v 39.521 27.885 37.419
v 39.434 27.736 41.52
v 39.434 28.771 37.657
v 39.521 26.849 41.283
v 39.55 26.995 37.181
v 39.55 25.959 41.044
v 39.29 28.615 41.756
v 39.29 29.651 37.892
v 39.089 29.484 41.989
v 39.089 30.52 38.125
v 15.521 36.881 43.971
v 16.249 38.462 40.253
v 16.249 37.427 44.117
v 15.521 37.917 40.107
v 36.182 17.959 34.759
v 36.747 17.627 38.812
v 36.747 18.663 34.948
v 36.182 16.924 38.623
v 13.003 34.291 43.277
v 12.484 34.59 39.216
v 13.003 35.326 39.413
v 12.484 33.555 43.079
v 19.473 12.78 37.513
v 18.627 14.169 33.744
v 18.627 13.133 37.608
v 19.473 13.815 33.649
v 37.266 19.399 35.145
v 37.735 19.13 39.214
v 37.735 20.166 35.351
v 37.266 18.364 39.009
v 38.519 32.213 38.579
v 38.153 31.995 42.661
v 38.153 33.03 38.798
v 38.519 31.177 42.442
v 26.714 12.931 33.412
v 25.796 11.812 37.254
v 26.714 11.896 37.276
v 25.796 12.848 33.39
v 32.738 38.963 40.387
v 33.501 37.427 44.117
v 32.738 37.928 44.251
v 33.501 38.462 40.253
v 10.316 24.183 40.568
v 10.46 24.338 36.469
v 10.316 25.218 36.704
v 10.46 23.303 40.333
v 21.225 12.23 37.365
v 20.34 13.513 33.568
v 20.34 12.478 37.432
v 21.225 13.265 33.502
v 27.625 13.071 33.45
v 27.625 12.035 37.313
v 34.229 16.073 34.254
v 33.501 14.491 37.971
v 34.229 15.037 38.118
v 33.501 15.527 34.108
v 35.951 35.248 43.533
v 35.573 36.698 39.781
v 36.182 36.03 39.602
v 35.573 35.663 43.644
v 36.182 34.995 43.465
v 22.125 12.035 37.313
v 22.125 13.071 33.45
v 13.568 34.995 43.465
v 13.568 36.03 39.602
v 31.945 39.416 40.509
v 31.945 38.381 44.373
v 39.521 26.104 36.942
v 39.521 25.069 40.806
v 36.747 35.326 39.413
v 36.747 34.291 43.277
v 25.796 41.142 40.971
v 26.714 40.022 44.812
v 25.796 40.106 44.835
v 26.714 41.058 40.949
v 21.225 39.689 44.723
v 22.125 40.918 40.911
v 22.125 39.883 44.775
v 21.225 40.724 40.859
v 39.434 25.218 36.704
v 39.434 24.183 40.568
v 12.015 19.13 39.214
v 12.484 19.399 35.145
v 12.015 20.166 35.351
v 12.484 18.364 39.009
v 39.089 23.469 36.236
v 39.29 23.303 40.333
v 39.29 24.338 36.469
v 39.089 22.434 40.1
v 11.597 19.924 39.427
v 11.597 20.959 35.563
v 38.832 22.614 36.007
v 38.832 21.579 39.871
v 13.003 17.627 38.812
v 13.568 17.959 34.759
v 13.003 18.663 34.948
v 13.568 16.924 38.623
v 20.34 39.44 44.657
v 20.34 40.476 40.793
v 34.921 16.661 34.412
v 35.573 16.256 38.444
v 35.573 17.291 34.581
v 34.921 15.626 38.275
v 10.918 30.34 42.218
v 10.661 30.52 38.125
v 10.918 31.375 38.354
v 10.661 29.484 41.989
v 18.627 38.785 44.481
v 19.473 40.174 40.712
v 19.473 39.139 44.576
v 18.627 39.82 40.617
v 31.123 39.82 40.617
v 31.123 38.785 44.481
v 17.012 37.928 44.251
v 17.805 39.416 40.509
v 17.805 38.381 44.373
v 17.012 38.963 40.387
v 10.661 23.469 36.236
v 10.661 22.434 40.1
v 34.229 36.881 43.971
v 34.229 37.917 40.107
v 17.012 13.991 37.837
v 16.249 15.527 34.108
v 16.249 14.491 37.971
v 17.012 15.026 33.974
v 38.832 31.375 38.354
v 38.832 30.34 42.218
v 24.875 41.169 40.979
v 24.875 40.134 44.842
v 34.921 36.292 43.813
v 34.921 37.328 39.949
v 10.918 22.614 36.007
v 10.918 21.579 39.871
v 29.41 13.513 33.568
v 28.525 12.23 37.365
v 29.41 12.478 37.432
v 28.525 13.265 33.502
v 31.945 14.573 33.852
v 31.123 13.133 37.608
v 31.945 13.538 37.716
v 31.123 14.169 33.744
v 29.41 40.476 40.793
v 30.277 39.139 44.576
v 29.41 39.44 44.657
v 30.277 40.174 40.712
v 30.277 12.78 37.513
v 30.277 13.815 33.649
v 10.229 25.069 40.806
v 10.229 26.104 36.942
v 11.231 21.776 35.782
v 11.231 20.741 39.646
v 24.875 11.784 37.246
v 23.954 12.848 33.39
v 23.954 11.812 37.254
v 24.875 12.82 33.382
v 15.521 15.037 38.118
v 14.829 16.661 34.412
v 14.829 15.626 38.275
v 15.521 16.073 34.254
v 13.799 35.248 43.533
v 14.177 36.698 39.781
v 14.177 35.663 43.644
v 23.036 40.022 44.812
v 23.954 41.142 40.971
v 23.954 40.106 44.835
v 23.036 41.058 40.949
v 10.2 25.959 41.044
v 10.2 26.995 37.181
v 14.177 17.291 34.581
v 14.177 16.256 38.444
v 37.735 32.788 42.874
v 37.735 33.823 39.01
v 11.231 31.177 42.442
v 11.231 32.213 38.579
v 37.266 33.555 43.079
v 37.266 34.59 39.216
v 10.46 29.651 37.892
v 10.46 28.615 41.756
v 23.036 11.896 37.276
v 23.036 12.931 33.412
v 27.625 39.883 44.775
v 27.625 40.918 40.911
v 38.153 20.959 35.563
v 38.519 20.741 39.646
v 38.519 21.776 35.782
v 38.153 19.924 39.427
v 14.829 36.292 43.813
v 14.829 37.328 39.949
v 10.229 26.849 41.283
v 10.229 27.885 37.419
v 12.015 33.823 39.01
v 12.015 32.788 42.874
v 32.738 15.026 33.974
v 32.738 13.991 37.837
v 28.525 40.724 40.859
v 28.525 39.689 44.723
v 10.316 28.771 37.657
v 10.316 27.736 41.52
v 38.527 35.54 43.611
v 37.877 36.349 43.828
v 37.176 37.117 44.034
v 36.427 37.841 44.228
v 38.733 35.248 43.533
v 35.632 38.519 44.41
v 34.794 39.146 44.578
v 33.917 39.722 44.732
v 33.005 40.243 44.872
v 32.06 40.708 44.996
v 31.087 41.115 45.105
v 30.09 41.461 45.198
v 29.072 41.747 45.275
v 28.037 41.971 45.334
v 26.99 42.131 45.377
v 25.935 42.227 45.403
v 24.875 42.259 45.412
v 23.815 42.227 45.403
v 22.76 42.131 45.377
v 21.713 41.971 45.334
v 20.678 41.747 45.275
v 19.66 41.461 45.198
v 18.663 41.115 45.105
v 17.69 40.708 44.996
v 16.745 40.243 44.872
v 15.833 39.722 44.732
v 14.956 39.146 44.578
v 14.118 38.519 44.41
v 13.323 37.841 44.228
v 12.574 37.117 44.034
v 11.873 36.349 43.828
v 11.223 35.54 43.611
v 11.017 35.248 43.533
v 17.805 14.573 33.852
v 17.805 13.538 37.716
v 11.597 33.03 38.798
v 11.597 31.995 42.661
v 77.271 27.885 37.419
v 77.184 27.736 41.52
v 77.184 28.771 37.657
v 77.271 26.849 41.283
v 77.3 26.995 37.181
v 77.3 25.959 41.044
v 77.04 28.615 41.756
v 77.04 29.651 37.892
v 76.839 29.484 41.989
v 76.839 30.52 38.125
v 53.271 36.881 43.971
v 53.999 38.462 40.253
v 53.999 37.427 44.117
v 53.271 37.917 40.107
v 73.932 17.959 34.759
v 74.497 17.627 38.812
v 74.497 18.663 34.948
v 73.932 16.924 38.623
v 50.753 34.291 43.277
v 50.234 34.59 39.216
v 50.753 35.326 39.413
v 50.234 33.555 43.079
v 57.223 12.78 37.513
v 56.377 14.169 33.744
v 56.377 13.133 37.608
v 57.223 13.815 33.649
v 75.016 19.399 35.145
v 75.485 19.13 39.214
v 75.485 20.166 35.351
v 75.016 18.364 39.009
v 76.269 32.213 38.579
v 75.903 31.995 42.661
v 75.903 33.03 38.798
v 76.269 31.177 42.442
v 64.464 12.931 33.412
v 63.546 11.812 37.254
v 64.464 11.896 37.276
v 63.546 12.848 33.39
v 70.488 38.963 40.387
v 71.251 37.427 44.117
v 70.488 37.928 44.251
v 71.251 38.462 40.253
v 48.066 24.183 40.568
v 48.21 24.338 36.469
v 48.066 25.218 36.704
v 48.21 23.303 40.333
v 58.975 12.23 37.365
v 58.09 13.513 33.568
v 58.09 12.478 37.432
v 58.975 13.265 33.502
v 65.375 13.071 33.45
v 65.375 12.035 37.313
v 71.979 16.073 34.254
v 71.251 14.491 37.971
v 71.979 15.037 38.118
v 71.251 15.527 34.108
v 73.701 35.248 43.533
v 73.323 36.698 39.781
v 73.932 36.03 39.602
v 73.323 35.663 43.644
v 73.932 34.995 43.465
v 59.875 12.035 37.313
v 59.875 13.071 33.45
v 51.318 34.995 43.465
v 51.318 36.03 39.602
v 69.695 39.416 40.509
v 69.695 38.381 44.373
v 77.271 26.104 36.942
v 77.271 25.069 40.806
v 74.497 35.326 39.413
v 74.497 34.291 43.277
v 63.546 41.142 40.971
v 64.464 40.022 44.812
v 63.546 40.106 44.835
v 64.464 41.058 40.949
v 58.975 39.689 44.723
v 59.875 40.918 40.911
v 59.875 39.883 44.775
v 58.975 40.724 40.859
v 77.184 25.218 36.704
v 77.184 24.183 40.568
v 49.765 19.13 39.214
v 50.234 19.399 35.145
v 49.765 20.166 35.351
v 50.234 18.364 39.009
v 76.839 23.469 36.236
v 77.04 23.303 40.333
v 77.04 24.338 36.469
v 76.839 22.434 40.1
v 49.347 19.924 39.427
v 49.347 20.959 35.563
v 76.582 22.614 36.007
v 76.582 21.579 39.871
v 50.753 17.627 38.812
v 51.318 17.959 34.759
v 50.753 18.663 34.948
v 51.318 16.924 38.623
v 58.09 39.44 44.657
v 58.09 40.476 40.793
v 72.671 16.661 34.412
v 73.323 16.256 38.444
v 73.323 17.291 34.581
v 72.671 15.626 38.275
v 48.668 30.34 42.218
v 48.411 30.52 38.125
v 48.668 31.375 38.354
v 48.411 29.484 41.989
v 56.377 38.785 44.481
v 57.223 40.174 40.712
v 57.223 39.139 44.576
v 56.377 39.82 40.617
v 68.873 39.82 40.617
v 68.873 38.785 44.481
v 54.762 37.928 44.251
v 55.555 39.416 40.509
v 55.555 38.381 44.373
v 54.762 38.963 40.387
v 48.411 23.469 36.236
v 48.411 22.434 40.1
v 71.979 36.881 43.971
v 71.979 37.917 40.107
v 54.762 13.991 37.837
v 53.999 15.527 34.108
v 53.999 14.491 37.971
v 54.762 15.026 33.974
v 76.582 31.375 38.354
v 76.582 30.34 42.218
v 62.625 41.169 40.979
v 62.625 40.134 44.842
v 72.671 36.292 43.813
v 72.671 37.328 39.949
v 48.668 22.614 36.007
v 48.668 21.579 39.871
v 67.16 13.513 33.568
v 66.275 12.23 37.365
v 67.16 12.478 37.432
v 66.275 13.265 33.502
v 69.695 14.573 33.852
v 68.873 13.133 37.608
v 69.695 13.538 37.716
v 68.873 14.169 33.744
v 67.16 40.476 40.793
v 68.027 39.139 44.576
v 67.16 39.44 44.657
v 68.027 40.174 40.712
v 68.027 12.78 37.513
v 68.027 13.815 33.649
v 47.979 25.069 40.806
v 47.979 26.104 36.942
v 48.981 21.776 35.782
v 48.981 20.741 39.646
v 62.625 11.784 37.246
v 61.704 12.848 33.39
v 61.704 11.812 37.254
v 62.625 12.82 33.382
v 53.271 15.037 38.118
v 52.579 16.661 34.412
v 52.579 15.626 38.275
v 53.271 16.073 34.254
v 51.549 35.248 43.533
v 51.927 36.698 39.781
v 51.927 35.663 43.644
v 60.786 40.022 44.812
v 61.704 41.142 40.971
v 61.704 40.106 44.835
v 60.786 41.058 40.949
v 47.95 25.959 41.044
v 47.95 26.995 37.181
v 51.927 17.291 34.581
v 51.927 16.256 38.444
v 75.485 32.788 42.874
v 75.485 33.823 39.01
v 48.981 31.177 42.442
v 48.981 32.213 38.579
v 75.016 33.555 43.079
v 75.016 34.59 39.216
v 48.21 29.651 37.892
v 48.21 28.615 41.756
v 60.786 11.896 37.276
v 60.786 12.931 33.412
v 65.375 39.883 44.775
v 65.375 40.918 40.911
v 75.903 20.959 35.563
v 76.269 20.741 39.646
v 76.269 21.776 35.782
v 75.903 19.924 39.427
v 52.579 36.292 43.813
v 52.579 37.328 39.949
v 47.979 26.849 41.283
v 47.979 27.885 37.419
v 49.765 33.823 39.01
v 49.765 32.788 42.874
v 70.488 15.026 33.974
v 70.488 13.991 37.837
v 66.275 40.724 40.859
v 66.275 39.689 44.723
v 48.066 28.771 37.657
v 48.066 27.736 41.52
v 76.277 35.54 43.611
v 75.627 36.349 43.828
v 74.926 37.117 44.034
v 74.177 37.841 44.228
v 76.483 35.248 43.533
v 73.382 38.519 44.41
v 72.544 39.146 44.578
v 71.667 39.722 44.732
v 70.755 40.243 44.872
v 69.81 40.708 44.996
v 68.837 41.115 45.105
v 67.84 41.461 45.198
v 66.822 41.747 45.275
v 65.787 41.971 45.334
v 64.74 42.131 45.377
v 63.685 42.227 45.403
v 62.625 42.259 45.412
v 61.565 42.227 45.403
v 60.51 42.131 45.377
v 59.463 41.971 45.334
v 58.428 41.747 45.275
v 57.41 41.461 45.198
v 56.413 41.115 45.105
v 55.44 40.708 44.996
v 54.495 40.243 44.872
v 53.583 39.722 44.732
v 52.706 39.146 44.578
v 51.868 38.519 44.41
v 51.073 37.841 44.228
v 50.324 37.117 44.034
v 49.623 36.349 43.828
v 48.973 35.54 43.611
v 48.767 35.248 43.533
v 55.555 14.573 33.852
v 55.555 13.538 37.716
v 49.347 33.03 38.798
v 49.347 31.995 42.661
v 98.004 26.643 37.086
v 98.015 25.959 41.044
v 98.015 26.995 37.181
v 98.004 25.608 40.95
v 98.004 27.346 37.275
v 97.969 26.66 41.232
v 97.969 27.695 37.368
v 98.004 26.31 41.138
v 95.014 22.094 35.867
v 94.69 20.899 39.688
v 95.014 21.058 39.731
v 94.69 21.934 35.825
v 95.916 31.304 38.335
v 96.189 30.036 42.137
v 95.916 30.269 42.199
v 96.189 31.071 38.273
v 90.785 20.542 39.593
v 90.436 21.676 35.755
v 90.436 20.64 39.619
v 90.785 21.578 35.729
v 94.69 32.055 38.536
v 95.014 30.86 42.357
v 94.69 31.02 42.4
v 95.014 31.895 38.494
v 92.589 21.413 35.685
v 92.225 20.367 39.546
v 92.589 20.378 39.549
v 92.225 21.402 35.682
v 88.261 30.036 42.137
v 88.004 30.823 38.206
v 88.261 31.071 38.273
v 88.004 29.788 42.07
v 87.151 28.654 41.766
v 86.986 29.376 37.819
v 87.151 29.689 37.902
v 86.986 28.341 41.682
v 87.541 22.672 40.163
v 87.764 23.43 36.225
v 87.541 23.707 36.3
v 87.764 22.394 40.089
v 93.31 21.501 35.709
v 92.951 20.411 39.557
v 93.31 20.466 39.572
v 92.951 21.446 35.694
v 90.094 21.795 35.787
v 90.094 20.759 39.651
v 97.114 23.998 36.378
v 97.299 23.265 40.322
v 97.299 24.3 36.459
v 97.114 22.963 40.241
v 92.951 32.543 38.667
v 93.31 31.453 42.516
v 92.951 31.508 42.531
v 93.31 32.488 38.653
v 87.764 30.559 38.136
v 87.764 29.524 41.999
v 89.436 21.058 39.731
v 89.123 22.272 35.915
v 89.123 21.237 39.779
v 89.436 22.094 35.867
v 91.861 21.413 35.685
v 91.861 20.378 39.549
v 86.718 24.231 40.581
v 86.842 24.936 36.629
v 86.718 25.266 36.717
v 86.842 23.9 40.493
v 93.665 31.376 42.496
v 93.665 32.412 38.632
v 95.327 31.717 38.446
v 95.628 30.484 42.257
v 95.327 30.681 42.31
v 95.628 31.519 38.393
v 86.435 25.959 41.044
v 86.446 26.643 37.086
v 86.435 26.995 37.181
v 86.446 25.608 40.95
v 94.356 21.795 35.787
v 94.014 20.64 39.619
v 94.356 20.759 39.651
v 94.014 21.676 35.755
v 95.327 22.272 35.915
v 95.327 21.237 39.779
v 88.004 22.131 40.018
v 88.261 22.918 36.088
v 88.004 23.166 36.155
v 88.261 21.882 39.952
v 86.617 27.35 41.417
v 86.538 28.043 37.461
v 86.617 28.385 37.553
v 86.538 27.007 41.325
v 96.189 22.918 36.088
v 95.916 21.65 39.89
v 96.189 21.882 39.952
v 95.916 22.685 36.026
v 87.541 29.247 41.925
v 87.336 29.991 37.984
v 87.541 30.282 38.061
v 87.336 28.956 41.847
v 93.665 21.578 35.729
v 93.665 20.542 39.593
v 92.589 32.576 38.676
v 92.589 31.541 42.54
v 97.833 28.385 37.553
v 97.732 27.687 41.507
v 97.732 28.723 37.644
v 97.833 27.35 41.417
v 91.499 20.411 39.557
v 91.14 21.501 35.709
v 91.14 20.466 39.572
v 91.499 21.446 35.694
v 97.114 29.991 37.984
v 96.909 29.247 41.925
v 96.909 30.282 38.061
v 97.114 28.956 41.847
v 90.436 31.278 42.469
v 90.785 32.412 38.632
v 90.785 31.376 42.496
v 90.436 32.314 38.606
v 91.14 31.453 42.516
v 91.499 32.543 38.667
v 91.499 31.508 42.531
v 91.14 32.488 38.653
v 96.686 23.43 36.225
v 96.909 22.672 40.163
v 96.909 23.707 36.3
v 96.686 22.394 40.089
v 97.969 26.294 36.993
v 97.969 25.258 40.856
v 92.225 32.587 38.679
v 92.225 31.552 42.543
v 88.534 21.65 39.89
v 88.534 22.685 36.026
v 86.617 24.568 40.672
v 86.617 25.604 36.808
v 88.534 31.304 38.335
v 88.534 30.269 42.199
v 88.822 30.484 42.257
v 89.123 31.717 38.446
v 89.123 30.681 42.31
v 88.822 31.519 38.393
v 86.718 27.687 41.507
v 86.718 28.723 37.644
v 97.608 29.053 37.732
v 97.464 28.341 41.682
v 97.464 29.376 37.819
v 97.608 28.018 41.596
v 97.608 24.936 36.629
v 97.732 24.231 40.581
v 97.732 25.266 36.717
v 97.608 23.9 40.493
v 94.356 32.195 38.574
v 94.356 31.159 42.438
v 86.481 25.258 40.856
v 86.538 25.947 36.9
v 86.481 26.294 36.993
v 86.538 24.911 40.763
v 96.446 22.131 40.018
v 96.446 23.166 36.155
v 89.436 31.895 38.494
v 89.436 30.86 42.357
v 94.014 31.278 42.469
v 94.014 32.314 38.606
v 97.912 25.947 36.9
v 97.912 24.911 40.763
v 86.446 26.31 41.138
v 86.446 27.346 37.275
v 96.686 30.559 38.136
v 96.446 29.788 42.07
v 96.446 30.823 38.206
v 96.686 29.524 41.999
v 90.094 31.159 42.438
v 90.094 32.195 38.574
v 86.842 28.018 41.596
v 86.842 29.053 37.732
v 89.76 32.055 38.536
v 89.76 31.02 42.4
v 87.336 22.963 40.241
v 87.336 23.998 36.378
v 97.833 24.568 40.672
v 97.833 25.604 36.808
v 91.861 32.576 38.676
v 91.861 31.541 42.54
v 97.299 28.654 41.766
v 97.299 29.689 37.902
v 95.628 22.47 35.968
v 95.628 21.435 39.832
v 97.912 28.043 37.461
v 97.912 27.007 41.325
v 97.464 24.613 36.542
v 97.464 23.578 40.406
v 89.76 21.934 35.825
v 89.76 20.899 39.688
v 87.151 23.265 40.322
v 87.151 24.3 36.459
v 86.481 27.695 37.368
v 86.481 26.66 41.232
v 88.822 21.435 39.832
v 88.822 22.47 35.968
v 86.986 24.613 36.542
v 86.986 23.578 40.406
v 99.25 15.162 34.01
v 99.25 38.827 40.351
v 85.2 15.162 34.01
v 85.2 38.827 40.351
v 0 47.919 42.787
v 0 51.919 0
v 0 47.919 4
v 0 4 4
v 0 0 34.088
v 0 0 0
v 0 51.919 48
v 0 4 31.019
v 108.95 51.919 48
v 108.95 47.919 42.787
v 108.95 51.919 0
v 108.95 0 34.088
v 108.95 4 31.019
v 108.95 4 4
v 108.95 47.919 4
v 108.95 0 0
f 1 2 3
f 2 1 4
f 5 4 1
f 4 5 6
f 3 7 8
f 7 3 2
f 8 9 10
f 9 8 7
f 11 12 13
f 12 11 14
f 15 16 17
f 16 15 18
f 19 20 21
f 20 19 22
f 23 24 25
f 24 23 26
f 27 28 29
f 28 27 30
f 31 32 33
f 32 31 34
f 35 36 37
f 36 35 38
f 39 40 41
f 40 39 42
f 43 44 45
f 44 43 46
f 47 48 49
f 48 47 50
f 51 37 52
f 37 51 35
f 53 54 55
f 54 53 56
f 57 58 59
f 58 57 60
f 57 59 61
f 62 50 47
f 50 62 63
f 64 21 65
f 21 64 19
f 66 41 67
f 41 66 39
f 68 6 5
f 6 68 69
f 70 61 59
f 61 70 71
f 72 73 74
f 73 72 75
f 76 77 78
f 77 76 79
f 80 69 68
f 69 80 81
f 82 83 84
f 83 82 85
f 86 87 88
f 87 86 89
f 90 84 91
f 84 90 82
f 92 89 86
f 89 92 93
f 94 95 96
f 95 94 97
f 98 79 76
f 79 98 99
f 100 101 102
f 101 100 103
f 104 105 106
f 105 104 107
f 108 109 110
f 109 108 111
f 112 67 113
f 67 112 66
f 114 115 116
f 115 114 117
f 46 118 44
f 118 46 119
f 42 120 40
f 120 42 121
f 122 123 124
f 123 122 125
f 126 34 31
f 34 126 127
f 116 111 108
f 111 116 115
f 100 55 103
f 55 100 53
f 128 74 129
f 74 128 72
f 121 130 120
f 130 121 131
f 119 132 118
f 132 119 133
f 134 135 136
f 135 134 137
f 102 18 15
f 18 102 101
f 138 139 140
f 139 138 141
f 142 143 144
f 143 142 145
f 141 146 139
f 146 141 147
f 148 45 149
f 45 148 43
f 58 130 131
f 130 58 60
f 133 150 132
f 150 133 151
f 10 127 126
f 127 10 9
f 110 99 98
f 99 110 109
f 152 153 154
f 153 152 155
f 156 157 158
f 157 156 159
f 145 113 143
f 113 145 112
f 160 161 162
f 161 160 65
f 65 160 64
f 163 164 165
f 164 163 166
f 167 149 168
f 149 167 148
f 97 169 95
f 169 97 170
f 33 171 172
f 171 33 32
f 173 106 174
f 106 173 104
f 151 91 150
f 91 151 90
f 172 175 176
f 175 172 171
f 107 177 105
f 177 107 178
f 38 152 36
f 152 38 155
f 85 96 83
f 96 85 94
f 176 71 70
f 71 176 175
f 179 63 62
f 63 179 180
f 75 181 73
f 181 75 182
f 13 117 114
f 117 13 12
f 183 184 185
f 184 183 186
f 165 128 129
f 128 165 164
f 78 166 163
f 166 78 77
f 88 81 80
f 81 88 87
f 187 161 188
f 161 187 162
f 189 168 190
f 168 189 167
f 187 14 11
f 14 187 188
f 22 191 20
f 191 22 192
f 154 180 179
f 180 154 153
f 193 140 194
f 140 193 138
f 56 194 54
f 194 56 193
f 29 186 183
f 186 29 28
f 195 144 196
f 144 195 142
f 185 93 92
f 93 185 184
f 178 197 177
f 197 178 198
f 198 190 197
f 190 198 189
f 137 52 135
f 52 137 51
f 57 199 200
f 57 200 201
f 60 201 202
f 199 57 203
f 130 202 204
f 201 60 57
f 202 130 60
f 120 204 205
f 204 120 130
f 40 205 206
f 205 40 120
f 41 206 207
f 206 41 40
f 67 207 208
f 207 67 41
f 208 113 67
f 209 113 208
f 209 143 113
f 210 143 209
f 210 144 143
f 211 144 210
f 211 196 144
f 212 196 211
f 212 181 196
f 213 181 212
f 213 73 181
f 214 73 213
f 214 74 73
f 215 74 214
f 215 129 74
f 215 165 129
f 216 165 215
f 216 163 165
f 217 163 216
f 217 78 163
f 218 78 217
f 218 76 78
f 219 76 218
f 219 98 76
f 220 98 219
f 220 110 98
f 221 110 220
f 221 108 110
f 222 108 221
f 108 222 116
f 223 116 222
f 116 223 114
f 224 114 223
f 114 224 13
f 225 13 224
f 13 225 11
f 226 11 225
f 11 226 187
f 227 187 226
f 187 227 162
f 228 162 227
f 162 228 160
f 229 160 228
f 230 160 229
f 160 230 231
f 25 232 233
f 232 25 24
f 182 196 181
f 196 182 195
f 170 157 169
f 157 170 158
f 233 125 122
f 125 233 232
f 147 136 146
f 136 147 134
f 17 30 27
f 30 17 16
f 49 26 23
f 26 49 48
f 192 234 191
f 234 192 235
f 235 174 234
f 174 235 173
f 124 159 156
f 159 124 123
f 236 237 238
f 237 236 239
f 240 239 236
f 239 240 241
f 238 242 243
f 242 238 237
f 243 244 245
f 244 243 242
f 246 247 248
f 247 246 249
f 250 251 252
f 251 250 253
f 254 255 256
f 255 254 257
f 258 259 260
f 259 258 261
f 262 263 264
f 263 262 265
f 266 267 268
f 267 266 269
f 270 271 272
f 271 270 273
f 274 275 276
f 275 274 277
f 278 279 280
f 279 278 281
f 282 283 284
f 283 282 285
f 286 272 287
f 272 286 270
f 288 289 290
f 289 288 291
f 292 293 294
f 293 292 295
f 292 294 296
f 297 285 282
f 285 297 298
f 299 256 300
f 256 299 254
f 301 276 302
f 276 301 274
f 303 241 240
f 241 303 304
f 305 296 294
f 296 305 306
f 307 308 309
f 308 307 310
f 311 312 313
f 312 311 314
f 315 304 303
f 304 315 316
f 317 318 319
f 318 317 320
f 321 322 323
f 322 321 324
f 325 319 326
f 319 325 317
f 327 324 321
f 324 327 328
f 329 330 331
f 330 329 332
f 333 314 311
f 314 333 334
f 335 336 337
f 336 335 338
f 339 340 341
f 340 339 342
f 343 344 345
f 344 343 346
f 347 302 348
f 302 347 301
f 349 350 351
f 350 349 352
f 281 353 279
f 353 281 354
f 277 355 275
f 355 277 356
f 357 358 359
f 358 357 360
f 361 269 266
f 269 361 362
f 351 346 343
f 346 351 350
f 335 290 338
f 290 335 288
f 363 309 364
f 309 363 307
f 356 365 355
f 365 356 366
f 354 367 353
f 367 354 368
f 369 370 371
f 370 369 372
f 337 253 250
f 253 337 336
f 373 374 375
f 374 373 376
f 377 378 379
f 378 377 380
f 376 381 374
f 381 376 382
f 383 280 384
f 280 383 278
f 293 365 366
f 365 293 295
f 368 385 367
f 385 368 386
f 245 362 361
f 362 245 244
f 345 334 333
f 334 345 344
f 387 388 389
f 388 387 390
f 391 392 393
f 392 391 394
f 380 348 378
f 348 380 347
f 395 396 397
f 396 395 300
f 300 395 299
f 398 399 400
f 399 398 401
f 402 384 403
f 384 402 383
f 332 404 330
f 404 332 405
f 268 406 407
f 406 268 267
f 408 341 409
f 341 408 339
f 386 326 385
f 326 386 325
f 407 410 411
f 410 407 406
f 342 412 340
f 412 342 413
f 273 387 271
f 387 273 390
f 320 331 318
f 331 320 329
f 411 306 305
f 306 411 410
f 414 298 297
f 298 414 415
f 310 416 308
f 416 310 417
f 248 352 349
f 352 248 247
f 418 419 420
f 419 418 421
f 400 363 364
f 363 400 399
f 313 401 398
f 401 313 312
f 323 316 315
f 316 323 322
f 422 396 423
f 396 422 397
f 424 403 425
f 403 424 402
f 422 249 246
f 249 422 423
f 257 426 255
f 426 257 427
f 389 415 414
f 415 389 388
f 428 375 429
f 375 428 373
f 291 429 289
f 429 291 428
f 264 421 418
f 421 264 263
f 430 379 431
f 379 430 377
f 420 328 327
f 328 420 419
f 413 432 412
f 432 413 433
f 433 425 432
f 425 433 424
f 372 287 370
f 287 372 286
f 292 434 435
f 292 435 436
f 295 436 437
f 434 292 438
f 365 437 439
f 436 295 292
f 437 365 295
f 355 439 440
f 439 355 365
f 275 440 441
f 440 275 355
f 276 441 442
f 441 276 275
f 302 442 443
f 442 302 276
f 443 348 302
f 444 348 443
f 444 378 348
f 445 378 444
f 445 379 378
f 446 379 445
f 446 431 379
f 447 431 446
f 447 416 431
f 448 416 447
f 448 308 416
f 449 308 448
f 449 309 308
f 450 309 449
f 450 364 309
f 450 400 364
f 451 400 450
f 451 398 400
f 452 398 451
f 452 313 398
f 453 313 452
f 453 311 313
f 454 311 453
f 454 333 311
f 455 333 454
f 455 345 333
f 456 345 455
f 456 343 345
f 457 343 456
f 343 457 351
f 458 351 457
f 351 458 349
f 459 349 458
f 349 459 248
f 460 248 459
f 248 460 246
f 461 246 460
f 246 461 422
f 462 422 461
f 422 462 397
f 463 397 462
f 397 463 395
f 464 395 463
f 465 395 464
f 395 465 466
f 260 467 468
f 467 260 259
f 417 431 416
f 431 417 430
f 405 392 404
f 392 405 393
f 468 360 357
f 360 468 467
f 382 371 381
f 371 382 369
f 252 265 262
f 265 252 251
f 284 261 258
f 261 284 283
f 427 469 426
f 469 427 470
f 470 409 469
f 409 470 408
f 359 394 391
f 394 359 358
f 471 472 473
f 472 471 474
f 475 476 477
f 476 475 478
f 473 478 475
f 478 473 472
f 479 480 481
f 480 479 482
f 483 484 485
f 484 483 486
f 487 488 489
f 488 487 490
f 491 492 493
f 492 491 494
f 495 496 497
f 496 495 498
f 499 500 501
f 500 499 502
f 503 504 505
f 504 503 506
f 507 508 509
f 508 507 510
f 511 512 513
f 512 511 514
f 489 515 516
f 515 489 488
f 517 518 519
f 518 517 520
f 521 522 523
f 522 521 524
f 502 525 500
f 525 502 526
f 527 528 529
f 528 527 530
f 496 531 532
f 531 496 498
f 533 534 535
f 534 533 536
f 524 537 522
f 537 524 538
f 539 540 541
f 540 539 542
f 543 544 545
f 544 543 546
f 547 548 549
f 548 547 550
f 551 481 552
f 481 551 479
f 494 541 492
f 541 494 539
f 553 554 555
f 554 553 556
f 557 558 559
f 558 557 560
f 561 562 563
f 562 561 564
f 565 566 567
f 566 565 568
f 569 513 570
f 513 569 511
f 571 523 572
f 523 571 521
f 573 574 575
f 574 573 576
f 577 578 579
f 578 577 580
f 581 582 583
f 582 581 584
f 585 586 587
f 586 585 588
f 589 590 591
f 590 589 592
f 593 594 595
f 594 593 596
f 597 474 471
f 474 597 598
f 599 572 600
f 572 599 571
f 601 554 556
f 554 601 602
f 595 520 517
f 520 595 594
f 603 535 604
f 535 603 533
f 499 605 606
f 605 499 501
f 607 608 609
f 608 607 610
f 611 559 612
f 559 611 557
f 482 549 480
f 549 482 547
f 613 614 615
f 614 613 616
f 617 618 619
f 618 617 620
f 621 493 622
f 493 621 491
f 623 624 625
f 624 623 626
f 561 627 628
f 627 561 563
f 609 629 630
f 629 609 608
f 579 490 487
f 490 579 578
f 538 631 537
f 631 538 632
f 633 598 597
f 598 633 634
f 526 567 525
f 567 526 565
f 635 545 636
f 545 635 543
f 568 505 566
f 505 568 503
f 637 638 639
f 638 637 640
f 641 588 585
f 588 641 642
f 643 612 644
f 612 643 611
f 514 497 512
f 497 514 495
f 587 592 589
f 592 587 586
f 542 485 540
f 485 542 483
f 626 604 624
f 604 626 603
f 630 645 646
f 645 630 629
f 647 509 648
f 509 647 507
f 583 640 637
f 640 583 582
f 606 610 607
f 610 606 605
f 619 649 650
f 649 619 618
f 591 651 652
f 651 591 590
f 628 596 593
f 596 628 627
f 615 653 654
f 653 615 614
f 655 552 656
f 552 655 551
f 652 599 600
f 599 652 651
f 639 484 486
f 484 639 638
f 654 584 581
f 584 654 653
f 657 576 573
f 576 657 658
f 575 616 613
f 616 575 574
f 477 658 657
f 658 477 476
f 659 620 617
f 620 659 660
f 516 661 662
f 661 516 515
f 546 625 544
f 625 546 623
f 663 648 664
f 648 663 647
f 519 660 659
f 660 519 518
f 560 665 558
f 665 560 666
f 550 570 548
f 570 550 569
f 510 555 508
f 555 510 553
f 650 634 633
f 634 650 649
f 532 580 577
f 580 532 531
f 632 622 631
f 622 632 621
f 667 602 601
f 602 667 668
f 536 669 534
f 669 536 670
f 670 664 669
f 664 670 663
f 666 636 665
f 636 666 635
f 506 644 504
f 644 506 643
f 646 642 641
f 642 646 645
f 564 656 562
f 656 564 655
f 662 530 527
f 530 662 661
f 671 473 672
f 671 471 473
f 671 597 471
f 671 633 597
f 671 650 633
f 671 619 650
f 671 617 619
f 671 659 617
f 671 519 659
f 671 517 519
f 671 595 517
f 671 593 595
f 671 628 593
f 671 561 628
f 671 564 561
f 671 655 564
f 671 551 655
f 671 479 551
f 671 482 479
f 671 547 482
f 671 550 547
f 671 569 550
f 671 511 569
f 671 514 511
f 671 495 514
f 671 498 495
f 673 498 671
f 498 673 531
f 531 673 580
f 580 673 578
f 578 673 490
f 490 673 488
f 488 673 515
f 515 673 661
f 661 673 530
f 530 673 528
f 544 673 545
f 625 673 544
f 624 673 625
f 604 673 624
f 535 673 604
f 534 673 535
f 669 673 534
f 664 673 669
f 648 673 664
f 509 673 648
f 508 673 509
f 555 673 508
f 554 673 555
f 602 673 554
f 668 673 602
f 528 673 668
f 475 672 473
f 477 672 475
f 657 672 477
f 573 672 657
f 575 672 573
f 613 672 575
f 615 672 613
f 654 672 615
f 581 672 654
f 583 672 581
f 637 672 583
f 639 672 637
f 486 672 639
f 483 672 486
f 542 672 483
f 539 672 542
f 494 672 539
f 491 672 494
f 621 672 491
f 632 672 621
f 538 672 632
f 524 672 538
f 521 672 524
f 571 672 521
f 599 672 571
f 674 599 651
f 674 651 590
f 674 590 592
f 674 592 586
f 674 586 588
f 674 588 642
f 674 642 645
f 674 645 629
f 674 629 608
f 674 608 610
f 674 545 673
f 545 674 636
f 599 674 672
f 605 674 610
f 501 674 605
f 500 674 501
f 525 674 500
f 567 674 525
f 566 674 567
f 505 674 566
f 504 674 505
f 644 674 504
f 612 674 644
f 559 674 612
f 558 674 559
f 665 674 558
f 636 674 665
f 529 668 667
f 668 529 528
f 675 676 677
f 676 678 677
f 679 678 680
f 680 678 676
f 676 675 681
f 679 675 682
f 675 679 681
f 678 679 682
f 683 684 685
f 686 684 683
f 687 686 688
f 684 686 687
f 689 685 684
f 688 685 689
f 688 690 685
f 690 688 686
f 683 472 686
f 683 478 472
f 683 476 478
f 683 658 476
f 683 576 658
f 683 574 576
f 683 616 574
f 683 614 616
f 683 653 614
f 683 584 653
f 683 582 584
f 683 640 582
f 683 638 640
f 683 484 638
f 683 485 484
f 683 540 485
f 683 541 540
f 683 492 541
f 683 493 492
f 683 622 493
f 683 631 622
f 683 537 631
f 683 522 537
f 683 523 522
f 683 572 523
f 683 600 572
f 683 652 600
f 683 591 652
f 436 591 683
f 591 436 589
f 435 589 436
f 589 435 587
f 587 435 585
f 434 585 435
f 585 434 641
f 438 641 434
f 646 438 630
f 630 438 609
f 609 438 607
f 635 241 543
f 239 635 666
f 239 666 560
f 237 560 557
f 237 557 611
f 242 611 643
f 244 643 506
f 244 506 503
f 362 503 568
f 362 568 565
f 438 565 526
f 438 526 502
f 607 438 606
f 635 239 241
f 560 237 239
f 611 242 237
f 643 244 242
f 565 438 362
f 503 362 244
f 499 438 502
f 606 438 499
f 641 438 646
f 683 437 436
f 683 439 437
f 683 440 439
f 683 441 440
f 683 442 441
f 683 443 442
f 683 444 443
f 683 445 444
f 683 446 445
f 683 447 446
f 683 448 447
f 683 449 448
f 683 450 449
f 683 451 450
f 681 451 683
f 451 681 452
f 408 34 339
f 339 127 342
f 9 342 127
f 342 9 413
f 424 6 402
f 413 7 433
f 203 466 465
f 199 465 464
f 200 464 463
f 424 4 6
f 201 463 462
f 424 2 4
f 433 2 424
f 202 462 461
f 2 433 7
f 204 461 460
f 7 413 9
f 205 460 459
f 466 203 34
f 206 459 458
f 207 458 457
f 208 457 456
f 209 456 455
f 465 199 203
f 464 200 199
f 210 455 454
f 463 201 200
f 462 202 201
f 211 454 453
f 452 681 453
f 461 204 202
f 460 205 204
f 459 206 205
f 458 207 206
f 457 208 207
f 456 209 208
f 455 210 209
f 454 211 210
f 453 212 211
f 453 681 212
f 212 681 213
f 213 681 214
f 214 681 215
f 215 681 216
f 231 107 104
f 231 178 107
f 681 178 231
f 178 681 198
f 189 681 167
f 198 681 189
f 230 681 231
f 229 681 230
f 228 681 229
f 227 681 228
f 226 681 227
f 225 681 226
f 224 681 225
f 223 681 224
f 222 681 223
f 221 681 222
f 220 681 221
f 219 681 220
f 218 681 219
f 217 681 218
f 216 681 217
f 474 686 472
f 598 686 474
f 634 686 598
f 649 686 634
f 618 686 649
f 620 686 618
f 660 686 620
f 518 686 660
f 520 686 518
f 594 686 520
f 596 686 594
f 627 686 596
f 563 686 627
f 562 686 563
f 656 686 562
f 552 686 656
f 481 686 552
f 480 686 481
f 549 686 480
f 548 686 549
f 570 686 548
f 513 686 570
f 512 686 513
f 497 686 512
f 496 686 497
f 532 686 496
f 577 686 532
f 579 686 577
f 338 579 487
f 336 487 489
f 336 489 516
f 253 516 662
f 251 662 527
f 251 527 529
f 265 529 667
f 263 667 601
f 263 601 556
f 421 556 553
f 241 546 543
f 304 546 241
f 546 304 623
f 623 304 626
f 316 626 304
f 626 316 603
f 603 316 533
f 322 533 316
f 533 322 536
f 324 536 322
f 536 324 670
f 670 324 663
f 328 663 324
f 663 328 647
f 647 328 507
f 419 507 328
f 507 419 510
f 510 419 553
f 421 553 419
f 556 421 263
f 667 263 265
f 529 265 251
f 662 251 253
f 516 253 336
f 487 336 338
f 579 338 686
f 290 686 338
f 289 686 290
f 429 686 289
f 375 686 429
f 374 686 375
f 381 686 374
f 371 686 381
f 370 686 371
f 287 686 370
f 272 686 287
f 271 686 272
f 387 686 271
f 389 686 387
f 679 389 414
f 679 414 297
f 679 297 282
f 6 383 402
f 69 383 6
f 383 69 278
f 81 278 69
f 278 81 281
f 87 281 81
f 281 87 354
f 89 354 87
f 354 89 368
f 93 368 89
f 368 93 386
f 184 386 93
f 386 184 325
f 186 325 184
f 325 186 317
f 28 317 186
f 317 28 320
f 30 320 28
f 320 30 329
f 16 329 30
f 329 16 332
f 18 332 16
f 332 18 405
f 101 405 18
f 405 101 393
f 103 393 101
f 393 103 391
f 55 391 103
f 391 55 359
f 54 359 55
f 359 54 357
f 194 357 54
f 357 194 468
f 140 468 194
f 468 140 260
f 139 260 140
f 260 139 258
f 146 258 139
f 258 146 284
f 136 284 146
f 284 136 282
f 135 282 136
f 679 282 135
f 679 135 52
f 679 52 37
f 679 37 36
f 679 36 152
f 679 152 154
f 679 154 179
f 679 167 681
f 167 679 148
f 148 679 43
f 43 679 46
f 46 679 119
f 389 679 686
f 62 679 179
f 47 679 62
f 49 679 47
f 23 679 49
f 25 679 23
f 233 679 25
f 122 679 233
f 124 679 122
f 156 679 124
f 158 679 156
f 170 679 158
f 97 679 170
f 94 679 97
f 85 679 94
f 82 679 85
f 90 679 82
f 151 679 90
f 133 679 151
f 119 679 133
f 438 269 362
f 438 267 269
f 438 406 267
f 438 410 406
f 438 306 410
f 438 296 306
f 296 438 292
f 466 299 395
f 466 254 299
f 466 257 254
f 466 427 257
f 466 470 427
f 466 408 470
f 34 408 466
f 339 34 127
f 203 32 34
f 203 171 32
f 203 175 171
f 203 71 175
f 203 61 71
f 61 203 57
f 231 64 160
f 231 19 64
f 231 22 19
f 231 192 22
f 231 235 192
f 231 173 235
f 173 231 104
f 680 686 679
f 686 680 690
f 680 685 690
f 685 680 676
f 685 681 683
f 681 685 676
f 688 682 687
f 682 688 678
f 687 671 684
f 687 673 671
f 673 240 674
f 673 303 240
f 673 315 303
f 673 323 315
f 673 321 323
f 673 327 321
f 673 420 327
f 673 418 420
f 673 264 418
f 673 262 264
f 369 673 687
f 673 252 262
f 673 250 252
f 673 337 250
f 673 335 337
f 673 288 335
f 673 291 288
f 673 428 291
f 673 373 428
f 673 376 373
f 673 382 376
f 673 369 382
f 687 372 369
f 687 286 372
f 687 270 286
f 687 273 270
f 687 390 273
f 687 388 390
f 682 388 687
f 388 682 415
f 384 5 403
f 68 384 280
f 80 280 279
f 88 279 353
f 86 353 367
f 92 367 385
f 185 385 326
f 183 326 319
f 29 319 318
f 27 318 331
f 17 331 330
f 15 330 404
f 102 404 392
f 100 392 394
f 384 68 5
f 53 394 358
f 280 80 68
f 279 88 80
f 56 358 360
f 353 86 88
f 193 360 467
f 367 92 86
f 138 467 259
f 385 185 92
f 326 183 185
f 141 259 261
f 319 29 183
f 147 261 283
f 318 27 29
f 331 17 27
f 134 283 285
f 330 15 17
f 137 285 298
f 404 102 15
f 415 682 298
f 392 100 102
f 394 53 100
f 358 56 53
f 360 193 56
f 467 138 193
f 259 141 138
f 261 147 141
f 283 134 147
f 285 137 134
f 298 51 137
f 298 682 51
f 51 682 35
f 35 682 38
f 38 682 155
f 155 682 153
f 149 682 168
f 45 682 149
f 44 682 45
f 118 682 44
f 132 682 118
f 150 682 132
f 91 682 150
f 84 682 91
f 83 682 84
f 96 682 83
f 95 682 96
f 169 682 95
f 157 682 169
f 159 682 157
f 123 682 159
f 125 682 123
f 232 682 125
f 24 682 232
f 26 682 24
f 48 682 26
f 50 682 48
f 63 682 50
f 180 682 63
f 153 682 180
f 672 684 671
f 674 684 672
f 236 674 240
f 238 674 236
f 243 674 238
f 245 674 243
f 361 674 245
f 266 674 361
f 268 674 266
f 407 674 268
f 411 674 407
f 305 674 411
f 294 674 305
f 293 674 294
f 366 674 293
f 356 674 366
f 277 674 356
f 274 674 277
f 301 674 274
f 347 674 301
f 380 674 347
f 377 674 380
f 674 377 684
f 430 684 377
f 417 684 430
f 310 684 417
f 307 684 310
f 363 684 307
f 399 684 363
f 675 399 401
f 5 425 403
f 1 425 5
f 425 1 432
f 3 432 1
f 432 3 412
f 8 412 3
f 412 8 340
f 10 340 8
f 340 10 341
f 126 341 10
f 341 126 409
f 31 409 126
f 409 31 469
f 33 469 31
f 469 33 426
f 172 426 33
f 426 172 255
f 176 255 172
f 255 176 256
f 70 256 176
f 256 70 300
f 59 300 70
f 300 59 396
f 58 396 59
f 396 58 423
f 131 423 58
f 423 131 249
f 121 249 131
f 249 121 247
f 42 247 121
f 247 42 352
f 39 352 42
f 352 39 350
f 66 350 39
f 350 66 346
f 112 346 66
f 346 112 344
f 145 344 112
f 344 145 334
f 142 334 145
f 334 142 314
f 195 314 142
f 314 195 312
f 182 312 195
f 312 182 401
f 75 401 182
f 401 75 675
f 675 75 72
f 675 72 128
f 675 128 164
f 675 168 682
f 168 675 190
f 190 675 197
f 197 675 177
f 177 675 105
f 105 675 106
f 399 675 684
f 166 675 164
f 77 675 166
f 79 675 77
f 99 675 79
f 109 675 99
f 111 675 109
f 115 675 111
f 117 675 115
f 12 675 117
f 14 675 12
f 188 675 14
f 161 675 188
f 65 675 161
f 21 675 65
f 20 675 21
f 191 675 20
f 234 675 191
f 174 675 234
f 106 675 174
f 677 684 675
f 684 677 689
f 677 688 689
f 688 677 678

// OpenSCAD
// All dimensions in millimeters

// Invariants
BUTTON_SHAFT_DIAMETER = 29.35;
BUTTON_OUTER_DIAMETER = 33.75;
BUTTON_FACE_THICKNESS = 5.00; // Approximate
BUTTON_SHAFT_LENGTH = 19.50;

SWITCH_SHAFT_DIAMETER = 11.58;
SWITCH_SHAFT_LENGTH = 11.30; // Total length, washer is inside the shaft
SWITCH_WASHER_DIAMETER = 17.45;
SWITCH_WASHER_THICKNESS = 5.05;

SWITCH_BOX_LENGTH = 24.50;
SWITCH_BOX_WIDTH = 14.05;
SWITCH_BOX_DEPTH = 13.95;

// Variables
INCLUDE_SWITCH = true;
ENCLOSURE_BACK_HEIGHT = 48.00;
FRAME_THICKNESS = 4.00;
COMPONENT_MARGIN = 4.00;
PANEL_MARGIN_HORIZONTAL = 8.00;
PANEL_MARGIN_VERTICAL = 10.00;
PANEL_SLOPE_DEGREES = 15.0;

// Derived

PANEL_WIDTH = BUTTON_OUTER_DIAMETER + (PANEL_MARGIN_VERTICAL * 2);

PANEL_LENGTH =
  INCLUDE_SWITCH
    ? (PANEL_MARGIN_HORIZONTAL * 2) + (BUTTON_OUTER_DIAMETER * 2) + SWITCH_WASHER_DIAMETER + (COMPONENT_MARGIN * 2)
    : (PANEL_MARGIN_HORIZONTAL * 2) + (BUTTON_OUTER_DIAMETER * 2) + COMPONENT_MARGIN;

PANEL_DISTANCE_HORIZONTAL = PANEL_WIDTH * cos(PANEL_SLOPE_DEGREES);
PANEL_DISTANCE_VERTICAL = PANEL_WIDTH * sin(PANEL_SLOPE_DEGREES);

PANEl_BACK_HEIGHT = ENCLOSURE_BACK_HEIGHT;
PANEL_BACK_POSITION_HORIZONTAL = PANEL_DISTANCE_HORIZONTAL - FRAME_THICKNESS;

PANEL_FRONT_HEIGHT = PANEl_BACK_HEIGHT - PANEL_DISTANCE_VERTICAL;

COMPONENT_CENTER_HORIZONTAL = (PANEL_WIDTH / 2) * cos(PANEL_SLOPE_DEGREES);
COMPONENT_CENTER_VERTICAL = PANEL_FRONT_HEIGHT + ((PANEL_WIDTH / 2) * sin(PANEL_SLOPE_DEGREES));

BUTTON_A_CENTER_X = PANEL_MARGIN_HORIZONTAL + (BUTTON_OUTER_DIAMETER / 2);
BUTTON_B_CENTER_X = PANEL_MARGIN_HORIZONTAL + BUTTON_OUTER_DIAMETER + COMPONENT_MARGIN + (BUTTON_OUTER_DIAMETER / 2);

SWITCH_CENTER_X = PANEL_LENGTH - (PANEL_MARGIN_HORIZONTAL + (SWITCH_WASHER_DIAMETER / 2));
SWITCH_BOX_OFFSET_Z = -1 * ((SWITCH_BOX_DEPTH / 2) + FRAME_THICKNESS);

// Models

module assembly() {
  enclosure();

  // button();

  // switch();
}

module button() {
  color("blue") {
    union() {
      // Shaft
      translate([0.0, 0.0, -BUTTON_SHAFT_LENGTH]) {
        cylinder(h=BUTTON_SHAFT_LENGTH, r=(BUTTON_SHAFT_DIAMETER / 2), $fn=100);
      }

      // Top
      cylinder(h=BUTTON_FACE_THICKNESS, r=(BUTTON_OUTER_DIAMETER / 2), $fn=100);
    }
  }
}

module switch() {
  color("green") {
    union() {
      // Top
      cylinder(h=SWITCH_WASHER_THICKNESS, r=(SWITCH_WASHER_DIAMETER / 2), $fn=100);

      // Shaft
      translate([0.0, 0.0, -FRAME_THICKNESS]) {
        cylinder(h=SWITCH_SHAFT_LENGTH, r=(SWITCH_SHAFT_DIAMETER / 2), $fn=100);
      }

      // Box
      translate([0.0, 0.0, SWITCH_BOX_OFFSET_Z]) {
        cube([SWITCH_BOX_WIDTH, SWITCH_BOX_LENGTH, SWITCH_BOX_DEPTH], center=true);
      }
    }
  }
}

module enclosure() {
  difference() {
    // Enclosure itself
    rotate([90.0, 0.0, 90.0]) {
      linear_extrude(PANEL_LENGTH, convexity=10) {
        side_sketch();
      }
    }

    // Button A
    translate([BUTTON_A_CENTER_X, COMPONENT_CENTER_HORIZONTAL, COMPONENT_CENTER_VERTICAL]) {
      rotate([PANEL_SLOPE_DEGREES, 0.0, 0.0]) {
        button();
      }
    }

    // Button B
    translate([BUTTON_B_CENTER_X, COMPONENT_CENTER_HORIZONTAL, COMPONENT_CENTER_VERTICAL]) {
      rotate([PANEL_SLOPE_DEGREES, 0.0, 0.0]) {
        button();
      }
    }

    //Switch
    if (INCLUDE_SWITCH) {
      translate([SWITCH_CENTER_X, COMPONENT_CENTER_HORIZONTAL, COMPONENT_CENTER_VERTICAL]) {
        rotate([PANEL_SLOPE_DEGREES, 0.0, 0.0]) {
          switch();
        }
      }
    }
  }
}

module side_sketch() {
  difference() {
    union() {
      // Front
      square([FRAME_THICKNESS, PANEL_FRONT_HEIGHT]);

      // Back
      translate([PANEL_BACK_POSITION_HORIZONTAL, 0.0, 0.0]) {
        square([FRAME_THICKNESS, PANEl_BACK_HEIGHT]);
      }

      // Panel (diagonal across the top)
      translate([0.0, PANEL_FRONT_HEIGHT, 0.0]) {
        rotate([0.0, 0.0, (PANEL_SLOPE_DEGREES - 90.0)]) {
          square([FRAME_THICKNESS, PANEL_WIDTH]);
        }
      }

      // Bottom
      square([PANEL_DISTANCE_HORIZONTAL, FRAME_THICKNESS]);
    }

    // Mask the back edge
    translate([PANEL_BACK_POSITION_HORIZONTAL + FRAME_THICKNESS, 0.0, 0.0]) {
      color("black") square([FRAME_THICKNESS, PANEl_BACK_HEIGHT]);
    }

    // Mask the panel edge
    translate([0.0, PANEL_FRONT_HEIGHT, 0.0]) {
      rotate([0.0, 0.0, (PANEL_SLOPE_DEGREES - 90.0)]) {
        translate([-FRAME_THICKNESS, 0.0, 0.0]) {
          color("black") square([FRAME_THICKNESS, PANEL_WIDTH]);
        }
      }
    }
  }
}

assembly();
